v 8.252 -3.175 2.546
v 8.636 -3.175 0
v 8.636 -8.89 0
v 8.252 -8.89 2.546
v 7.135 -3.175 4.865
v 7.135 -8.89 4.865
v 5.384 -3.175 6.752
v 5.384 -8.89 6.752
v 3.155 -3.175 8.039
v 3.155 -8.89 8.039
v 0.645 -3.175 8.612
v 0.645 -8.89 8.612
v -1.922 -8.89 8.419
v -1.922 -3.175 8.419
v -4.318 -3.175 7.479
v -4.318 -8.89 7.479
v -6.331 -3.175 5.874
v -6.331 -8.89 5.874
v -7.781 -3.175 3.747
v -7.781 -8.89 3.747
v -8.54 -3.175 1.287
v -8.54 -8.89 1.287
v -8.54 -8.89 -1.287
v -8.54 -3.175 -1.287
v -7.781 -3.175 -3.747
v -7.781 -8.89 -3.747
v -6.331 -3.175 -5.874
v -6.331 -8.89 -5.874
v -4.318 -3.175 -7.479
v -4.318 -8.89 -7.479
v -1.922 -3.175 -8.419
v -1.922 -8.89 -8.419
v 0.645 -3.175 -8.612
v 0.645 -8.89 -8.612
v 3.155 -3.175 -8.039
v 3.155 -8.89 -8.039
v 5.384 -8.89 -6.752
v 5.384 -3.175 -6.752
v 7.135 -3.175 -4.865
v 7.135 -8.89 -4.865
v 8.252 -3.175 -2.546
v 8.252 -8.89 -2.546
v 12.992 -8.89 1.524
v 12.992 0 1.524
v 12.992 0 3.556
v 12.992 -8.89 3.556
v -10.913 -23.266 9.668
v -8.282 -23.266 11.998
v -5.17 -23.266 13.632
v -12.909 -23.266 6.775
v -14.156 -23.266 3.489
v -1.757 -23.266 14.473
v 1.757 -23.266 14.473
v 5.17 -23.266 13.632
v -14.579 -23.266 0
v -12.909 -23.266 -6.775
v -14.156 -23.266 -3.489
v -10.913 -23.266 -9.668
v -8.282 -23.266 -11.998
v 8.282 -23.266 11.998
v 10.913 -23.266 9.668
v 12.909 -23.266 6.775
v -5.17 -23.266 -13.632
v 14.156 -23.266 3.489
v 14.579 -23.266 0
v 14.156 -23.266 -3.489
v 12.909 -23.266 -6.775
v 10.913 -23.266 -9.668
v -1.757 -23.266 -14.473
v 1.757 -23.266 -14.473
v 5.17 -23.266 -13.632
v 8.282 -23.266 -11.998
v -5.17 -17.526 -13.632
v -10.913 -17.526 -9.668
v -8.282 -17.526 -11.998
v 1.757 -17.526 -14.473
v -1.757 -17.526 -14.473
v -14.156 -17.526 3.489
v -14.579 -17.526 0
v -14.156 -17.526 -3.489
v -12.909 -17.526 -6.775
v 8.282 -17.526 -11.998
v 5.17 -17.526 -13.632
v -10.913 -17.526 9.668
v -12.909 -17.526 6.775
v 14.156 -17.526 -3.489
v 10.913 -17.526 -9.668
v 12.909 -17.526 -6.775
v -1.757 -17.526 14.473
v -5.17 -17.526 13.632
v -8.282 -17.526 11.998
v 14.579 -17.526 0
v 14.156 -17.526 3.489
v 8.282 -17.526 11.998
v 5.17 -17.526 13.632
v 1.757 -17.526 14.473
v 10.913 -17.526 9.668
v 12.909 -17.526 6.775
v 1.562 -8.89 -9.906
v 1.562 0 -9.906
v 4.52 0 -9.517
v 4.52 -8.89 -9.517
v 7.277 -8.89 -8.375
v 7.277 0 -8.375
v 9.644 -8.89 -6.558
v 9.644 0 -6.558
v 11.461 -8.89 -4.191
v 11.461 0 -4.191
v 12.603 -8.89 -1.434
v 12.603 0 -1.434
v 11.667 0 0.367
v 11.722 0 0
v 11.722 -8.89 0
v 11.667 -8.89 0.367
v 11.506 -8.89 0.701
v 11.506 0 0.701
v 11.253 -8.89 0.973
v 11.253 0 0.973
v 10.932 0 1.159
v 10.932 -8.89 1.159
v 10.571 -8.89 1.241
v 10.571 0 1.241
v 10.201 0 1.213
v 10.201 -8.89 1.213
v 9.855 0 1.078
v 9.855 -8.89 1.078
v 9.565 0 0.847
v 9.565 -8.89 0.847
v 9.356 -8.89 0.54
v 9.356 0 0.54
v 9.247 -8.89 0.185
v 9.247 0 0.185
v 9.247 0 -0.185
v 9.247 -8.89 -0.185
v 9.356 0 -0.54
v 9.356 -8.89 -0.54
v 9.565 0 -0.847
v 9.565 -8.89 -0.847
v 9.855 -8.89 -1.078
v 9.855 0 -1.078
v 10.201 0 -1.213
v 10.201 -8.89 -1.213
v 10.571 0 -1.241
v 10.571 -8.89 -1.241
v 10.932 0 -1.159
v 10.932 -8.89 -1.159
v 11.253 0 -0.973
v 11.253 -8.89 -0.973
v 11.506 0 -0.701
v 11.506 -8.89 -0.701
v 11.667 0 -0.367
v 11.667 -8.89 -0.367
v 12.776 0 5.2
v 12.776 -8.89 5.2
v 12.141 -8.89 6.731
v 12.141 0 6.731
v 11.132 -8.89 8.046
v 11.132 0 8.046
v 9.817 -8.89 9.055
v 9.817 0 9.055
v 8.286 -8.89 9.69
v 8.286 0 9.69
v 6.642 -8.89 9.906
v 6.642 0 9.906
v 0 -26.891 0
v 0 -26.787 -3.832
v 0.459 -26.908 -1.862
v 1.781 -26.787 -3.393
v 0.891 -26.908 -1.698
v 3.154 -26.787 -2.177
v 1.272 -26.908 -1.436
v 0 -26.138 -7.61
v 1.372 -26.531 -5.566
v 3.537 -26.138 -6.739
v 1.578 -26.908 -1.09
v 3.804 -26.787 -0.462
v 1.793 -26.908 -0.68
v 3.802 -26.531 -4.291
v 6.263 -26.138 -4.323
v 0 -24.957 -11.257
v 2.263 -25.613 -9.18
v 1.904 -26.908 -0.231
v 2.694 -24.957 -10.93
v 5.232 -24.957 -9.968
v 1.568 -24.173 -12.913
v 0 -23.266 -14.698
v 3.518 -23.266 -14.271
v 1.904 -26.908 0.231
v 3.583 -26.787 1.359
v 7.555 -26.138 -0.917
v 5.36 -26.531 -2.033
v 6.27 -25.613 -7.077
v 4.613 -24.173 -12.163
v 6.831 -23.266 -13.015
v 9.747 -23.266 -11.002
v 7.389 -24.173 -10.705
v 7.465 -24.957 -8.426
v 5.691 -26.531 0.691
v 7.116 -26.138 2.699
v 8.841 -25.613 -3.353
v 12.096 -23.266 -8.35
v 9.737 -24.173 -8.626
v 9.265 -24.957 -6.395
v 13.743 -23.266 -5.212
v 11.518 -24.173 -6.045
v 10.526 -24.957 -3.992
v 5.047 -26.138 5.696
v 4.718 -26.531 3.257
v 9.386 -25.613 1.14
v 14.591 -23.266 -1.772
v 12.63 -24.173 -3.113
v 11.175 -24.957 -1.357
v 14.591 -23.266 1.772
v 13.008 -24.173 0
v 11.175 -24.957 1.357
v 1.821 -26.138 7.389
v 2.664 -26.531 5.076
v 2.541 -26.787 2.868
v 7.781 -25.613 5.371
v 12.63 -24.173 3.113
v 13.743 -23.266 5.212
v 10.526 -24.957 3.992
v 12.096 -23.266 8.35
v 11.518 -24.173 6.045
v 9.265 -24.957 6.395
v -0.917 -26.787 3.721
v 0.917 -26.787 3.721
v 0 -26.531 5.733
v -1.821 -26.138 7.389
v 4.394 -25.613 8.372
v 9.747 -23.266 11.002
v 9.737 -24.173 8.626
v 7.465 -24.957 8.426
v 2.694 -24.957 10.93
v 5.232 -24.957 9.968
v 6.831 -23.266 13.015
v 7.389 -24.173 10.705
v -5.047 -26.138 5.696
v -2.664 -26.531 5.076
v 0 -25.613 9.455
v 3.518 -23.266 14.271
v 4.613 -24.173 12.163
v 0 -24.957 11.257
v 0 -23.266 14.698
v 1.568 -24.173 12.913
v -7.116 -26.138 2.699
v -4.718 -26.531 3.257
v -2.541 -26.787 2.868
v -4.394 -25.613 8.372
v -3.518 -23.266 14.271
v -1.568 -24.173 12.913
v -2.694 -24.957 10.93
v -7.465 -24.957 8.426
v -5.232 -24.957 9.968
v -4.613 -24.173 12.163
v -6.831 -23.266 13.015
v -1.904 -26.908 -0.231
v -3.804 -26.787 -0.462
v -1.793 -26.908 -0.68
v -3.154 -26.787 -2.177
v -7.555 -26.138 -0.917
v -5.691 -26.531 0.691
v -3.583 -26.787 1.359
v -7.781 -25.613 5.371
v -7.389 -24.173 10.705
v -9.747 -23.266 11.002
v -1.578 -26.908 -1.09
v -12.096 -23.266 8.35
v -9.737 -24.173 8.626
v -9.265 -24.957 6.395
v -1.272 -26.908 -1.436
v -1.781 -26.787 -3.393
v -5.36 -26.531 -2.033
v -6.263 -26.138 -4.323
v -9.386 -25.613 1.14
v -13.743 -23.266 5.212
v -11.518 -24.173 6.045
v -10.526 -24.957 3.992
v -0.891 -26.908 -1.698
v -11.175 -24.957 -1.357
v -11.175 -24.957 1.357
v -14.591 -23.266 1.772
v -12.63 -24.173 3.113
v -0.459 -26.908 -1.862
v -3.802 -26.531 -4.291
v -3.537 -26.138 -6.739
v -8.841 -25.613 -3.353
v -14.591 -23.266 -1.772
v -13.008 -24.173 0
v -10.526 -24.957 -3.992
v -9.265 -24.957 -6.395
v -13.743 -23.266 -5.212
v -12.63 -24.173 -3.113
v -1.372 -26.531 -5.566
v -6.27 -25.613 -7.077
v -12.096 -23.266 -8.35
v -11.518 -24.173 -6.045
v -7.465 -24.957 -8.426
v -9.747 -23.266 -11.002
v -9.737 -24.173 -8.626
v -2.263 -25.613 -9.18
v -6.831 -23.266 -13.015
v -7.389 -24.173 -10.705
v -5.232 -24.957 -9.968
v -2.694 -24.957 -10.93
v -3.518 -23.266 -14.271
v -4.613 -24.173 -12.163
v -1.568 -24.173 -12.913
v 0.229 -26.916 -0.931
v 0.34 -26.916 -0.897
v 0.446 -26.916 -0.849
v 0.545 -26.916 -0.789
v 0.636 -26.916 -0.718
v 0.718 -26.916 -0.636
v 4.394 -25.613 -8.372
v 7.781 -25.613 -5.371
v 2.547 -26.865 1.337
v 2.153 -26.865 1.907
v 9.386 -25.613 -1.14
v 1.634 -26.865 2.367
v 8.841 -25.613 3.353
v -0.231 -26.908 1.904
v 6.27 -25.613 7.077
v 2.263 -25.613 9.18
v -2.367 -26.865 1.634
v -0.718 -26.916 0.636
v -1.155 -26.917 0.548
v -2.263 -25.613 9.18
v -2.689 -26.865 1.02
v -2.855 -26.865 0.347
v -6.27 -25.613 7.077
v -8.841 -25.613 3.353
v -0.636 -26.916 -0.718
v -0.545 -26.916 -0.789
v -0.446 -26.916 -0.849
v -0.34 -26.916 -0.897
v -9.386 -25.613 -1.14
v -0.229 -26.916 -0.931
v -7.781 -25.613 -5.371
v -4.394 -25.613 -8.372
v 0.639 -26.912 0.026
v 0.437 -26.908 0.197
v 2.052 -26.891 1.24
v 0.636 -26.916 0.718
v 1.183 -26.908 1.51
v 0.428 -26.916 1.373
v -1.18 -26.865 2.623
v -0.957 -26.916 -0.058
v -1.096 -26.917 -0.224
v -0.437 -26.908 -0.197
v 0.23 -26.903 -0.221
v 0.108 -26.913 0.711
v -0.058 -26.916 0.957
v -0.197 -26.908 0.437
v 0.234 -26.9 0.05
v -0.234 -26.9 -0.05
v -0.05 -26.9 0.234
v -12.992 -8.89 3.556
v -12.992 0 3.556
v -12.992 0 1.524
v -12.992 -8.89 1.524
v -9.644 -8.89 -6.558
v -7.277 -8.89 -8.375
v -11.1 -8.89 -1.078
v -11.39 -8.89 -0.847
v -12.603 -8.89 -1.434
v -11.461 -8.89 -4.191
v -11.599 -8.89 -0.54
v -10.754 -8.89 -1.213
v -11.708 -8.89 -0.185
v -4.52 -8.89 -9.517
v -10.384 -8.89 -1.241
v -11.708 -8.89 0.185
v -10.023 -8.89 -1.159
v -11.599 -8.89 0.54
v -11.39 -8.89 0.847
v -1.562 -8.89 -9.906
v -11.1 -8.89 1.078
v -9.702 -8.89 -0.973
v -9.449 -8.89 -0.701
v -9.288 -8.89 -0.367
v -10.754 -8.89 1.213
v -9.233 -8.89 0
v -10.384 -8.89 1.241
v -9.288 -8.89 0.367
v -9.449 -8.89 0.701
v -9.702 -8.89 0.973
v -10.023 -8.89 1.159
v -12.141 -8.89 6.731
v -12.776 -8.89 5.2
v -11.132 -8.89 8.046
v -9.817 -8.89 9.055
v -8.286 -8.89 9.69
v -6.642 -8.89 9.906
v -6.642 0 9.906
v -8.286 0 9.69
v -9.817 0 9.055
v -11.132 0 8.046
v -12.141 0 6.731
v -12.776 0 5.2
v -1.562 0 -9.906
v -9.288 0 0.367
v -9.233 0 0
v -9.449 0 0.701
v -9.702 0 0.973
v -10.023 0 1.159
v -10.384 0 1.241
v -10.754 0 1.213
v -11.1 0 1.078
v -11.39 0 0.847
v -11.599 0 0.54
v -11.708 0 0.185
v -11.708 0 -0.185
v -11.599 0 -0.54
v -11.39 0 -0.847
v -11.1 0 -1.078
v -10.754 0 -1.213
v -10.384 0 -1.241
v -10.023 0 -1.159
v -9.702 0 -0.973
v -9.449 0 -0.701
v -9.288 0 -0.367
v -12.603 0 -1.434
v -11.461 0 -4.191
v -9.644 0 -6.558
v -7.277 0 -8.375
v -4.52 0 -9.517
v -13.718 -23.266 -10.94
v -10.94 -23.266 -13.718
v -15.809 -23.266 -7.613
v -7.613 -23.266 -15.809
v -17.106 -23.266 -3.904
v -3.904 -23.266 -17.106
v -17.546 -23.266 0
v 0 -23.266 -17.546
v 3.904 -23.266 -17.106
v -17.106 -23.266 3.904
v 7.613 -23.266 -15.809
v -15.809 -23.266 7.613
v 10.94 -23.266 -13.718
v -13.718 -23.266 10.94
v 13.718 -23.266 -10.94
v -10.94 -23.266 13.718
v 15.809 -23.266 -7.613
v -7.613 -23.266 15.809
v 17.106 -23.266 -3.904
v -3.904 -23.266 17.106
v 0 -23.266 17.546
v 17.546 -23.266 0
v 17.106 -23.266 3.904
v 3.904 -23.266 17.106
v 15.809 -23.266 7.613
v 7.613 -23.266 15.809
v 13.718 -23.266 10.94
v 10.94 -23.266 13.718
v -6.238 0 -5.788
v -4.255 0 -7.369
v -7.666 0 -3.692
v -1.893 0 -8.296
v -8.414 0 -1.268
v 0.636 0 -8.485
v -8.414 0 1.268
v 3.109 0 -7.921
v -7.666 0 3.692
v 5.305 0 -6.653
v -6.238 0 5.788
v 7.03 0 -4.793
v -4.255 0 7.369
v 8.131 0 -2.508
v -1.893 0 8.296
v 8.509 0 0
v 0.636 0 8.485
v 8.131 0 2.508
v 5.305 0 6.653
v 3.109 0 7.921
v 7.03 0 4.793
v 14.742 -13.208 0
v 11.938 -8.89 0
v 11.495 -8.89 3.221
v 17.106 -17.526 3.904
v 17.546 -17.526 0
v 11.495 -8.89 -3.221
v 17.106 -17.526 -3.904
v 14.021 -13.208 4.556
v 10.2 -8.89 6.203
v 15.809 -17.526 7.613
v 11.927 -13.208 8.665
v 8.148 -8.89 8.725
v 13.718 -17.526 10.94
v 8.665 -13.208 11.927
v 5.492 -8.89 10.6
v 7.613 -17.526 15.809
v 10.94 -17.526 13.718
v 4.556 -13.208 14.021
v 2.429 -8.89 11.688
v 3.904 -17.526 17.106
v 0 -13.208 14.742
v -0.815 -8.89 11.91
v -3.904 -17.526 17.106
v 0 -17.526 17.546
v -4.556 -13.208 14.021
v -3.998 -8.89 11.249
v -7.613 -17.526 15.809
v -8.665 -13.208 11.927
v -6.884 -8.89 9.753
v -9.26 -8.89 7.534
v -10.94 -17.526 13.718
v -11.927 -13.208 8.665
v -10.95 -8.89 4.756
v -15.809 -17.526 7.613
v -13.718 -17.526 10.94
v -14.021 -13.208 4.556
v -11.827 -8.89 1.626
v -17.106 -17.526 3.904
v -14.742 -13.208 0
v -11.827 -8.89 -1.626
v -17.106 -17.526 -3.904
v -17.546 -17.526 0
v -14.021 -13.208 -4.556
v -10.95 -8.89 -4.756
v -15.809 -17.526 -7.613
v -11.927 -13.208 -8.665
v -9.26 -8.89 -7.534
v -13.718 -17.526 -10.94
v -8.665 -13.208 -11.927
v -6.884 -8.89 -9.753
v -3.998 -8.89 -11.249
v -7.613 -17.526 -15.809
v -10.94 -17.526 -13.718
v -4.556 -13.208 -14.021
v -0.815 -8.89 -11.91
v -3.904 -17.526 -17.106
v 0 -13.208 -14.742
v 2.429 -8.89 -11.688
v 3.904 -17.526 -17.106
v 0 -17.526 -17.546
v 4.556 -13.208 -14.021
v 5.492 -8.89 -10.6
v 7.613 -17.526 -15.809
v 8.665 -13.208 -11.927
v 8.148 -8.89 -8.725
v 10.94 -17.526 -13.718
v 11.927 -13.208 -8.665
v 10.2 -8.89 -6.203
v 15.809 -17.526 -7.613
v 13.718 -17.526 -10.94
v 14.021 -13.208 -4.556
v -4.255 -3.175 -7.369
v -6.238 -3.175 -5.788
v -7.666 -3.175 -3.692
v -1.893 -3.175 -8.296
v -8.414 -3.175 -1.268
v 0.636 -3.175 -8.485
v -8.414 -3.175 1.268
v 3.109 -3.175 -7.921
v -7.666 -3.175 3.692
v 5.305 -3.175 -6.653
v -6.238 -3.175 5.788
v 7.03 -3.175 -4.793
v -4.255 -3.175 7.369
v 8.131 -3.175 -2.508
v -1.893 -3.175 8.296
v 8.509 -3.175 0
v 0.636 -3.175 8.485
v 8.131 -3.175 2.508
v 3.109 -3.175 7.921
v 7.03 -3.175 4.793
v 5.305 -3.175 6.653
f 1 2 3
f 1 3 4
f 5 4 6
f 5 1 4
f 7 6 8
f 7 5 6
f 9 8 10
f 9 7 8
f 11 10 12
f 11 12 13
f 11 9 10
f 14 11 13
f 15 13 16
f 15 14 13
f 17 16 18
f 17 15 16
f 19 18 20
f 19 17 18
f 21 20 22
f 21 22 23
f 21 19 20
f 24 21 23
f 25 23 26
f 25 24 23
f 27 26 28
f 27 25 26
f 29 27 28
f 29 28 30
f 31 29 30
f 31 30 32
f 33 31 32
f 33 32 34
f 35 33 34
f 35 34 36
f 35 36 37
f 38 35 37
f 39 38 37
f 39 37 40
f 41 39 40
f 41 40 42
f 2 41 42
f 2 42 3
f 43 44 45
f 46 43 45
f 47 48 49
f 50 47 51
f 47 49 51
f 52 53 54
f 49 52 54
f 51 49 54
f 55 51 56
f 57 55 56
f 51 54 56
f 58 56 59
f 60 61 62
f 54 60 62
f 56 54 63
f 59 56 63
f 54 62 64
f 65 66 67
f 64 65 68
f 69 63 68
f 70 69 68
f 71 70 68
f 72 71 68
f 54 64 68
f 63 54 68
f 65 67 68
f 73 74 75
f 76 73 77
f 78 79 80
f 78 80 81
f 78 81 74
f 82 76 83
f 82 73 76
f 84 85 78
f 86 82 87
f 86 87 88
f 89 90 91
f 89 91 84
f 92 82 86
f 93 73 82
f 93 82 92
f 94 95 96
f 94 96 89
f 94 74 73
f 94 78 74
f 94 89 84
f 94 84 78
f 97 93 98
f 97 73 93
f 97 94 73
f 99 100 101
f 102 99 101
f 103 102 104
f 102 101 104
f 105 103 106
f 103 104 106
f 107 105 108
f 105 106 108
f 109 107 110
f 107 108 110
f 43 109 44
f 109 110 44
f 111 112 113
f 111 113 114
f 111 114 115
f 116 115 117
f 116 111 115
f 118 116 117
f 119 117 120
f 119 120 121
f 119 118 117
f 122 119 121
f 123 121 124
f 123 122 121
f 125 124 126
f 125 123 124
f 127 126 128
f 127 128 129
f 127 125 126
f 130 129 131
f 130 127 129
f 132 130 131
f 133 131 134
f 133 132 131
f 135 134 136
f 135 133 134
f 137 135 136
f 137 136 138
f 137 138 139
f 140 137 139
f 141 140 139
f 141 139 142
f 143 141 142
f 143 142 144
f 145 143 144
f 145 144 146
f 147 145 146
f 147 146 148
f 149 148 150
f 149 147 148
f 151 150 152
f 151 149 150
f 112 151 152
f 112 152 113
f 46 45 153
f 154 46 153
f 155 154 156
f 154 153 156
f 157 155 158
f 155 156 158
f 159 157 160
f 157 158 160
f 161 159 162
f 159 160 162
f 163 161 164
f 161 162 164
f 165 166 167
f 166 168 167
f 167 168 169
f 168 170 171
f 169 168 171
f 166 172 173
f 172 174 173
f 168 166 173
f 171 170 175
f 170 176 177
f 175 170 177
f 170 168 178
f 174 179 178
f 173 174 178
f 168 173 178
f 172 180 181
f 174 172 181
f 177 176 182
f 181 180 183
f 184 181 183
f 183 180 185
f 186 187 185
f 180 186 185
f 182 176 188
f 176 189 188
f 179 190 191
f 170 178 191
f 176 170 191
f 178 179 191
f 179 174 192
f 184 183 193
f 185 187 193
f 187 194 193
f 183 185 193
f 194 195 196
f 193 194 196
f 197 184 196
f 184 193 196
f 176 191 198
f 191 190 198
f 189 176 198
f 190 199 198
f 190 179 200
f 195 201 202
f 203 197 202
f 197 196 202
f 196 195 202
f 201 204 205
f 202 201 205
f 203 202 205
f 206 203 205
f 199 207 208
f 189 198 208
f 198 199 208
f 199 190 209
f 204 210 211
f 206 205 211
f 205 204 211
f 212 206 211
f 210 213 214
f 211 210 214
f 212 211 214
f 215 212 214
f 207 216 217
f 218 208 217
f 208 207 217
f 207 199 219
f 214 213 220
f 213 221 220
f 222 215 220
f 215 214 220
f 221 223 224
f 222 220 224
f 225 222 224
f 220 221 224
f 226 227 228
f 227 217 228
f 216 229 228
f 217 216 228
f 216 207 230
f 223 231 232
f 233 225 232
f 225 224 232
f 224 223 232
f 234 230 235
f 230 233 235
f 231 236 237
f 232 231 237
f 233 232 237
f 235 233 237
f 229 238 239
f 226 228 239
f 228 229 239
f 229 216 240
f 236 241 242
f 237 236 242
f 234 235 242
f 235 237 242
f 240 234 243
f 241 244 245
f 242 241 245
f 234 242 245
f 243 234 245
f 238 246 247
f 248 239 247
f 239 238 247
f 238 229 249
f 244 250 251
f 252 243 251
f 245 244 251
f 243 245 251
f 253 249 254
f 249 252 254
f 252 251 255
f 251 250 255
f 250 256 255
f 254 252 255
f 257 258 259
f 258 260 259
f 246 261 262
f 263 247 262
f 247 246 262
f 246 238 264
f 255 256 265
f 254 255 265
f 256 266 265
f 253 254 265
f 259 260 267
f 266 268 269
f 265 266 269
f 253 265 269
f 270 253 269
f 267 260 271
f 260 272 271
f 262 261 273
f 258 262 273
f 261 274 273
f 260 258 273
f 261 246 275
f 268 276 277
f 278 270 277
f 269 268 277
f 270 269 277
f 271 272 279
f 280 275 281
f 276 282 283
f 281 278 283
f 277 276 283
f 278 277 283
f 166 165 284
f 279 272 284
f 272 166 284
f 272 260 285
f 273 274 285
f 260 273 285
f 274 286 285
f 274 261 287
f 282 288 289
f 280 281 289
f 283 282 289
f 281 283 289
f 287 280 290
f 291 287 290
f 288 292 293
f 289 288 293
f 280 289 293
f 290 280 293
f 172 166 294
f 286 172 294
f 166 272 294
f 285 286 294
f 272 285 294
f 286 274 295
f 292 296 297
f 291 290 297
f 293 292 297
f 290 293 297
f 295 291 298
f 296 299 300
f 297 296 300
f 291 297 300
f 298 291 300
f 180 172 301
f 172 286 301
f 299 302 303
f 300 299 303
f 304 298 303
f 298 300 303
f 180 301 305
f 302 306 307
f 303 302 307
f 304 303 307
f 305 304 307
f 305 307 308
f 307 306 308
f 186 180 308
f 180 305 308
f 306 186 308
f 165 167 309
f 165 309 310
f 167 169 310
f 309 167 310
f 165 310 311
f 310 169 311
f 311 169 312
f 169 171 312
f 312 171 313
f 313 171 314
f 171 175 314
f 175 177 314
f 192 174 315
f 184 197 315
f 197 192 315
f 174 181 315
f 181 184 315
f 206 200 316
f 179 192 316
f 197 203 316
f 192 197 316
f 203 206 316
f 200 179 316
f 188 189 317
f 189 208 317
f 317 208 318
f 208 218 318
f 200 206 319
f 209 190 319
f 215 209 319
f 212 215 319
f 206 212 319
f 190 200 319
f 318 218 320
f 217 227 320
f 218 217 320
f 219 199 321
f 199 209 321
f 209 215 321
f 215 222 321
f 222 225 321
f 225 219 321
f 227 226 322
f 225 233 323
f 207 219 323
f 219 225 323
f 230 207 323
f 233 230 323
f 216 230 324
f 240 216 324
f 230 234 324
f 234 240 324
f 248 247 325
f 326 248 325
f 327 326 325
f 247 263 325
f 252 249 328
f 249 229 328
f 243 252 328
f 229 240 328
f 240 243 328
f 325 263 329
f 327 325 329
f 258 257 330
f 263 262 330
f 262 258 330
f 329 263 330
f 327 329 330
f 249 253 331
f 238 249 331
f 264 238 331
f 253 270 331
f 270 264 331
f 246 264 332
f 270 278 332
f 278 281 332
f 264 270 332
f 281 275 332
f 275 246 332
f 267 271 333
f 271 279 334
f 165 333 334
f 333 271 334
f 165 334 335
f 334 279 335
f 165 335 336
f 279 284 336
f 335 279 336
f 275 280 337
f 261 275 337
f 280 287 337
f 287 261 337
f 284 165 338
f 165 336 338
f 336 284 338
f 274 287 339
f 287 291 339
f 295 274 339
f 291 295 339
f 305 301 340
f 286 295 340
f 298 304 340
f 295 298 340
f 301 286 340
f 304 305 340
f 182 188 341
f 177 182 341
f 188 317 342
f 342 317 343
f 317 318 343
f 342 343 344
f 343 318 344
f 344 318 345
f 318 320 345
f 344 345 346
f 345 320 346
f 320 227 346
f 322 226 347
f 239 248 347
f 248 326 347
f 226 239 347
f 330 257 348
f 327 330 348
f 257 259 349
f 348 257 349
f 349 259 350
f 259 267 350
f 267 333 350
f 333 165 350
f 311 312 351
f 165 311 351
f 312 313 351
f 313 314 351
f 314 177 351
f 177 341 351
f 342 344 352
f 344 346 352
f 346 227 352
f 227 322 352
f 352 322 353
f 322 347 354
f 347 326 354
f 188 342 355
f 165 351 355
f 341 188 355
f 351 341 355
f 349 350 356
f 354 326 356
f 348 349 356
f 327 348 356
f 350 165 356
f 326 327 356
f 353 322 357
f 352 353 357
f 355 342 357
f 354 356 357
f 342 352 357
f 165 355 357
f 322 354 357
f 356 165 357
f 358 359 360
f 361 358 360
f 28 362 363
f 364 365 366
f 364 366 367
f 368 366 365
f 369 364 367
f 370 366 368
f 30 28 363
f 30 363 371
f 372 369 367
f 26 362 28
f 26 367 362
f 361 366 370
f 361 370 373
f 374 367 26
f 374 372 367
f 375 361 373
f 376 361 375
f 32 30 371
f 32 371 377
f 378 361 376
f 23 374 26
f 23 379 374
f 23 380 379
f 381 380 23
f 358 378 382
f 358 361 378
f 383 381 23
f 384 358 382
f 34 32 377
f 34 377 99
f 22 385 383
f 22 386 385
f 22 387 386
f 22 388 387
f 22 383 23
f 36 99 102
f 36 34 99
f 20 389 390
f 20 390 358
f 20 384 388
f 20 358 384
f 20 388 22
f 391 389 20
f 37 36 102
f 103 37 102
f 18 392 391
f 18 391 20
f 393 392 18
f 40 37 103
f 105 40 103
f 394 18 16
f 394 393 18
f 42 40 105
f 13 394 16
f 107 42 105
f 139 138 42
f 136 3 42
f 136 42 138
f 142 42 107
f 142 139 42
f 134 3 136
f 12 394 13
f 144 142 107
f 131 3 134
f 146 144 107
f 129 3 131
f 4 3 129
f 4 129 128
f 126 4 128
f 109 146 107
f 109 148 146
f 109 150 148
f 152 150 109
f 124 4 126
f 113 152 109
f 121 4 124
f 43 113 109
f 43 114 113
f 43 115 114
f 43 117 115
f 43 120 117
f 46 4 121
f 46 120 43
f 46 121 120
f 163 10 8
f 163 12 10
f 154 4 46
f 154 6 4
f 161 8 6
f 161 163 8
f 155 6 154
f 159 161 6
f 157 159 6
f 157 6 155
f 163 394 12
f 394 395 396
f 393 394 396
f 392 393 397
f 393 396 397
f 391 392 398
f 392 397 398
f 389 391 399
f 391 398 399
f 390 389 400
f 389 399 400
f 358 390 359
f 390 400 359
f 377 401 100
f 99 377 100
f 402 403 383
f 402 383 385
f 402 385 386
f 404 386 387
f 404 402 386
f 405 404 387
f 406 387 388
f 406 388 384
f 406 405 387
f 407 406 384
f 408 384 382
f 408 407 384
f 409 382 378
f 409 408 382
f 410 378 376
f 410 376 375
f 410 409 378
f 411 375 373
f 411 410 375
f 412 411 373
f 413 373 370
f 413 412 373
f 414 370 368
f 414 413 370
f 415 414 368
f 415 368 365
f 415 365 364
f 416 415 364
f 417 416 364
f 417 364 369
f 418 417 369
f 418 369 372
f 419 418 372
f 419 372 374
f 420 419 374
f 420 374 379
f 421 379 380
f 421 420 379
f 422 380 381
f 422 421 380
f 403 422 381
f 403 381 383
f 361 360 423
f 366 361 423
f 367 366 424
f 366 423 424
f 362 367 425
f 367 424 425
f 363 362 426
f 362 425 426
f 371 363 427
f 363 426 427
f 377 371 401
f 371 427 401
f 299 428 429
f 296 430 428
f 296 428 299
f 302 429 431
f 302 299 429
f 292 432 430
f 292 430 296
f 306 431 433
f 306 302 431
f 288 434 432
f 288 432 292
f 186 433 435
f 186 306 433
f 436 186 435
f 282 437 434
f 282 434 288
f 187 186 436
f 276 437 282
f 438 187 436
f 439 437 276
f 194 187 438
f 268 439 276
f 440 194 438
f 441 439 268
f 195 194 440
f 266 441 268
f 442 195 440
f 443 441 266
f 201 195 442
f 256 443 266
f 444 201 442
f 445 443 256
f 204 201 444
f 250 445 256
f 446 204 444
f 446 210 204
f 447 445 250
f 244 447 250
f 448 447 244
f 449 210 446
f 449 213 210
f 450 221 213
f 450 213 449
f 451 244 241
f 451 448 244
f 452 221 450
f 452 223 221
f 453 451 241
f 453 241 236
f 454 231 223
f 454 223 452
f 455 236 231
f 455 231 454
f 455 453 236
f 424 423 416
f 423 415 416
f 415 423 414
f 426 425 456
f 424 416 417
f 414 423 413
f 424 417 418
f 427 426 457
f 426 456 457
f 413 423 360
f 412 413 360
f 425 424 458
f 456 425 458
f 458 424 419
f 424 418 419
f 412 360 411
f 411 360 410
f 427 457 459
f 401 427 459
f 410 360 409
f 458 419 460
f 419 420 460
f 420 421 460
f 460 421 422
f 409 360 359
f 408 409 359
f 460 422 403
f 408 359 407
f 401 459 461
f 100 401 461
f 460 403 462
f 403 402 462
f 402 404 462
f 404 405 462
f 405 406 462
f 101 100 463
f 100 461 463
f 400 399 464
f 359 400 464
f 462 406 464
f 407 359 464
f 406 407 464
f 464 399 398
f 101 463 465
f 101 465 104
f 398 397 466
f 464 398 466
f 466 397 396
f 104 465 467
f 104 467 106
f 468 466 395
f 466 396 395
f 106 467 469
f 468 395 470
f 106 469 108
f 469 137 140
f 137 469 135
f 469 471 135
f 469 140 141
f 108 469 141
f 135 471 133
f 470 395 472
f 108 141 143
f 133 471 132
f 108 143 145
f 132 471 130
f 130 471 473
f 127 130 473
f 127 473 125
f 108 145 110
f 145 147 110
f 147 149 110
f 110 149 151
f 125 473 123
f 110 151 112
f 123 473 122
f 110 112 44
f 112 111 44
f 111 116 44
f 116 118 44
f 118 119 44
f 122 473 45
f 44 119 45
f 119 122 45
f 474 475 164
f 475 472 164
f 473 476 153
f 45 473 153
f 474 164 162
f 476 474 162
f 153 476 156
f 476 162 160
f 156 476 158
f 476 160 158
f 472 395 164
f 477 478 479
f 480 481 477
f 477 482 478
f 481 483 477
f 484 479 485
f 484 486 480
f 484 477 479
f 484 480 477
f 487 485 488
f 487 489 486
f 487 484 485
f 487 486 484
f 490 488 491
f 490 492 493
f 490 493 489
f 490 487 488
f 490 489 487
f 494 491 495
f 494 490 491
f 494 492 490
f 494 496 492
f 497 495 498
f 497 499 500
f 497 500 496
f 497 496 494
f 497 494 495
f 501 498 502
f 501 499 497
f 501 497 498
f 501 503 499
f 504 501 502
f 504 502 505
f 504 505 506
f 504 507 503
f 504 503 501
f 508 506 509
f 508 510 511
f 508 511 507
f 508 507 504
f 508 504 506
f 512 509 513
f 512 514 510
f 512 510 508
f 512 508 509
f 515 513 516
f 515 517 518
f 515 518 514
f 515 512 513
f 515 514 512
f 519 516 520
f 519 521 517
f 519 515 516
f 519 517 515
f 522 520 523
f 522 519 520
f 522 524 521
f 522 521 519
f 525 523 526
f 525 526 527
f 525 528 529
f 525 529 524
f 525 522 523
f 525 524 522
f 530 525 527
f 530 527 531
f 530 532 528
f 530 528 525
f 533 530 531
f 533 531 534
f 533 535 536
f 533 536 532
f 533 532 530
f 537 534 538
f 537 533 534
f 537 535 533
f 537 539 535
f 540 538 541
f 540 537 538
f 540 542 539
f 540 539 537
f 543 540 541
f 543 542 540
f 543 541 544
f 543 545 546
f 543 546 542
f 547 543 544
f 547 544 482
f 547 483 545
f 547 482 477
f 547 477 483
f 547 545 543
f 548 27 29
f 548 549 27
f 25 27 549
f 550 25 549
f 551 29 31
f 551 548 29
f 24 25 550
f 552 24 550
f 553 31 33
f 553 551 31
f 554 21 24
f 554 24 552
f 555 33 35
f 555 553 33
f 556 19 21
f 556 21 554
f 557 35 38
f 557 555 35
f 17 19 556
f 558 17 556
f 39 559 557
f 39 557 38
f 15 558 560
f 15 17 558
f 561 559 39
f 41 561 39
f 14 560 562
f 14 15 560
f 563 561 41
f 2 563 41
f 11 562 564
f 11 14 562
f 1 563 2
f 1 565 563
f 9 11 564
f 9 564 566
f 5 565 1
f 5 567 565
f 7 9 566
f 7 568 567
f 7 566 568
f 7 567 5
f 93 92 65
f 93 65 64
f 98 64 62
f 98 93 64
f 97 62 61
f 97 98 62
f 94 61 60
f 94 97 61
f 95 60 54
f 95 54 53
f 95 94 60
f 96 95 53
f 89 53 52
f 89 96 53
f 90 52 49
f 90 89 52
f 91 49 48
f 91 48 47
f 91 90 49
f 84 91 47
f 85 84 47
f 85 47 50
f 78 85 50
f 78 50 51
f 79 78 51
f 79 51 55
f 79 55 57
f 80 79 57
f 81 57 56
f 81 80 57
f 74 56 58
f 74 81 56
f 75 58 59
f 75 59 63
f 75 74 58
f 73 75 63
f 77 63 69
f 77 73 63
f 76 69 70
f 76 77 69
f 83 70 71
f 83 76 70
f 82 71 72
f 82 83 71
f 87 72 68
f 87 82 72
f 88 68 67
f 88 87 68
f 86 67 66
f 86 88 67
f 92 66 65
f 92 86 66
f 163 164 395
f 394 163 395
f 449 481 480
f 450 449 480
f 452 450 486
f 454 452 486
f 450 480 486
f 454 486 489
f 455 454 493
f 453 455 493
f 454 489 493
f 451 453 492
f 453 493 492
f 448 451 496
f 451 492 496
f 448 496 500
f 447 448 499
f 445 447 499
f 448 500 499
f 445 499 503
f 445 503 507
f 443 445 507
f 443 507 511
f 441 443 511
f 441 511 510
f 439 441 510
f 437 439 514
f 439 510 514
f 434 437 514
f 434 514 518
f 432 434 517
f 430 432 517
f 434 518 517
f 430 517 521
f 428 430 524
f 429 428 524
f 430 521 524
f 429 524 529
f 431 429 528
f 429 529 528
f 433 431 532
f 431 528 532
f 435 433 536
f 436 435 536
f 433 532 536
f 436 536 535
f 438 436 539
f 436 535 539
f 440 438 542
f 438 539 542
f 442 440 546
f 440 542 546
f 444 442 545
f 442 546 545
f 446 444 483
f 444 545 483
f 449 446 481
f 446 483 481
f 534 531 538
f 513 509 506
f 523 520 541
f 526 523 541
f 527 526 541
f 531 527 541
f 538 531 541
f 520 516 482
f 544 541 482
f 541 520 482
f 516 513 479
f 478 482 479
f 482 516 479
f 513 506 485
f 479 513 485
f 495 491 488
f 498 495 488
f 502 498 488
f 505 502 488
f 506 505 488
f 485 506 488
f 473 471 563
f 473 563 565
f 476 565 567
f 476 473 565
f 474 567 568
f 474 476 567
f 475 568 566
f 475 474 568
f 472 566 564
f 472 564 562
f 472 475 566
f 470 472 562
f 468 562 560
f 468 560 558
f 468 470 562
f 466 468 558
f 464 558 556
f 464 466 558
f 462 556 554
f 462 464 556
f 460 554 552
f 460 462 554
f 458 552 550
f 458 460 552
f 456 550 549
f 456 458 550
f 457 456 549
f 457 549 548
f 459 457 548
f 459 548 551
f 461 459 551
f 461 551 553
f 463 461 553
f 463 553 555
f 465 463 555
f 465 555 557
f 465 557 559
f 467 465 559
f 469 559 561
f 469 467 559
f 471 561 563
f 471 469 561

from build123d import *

# Parameters (mm, degrees)
F0_R     = 1.2446
F0_R_2   = 8.636
F1_DEPTH = 8.89
F0_R_3   = 8.509
F2_DEPTH = 3.175
F3_R     = 11.938
F4_DEPTH = 8.636
F4_TAPER = -33
F5_R     = 17.54632
F5_R_2   = 14.5791622743
F6_DEPTH = 5.7404


with BuildPart() as f1:
    # F0 (on Front) → F1 (new body)
    with BuildSketch(Plane.XZ):
        with BuildLine():
            Line((6.6421, 9.906), (-6.6421, 9.906))
            ThreePointArc((-6.6421, 9.906), (-11.1322280605, 8.0461280605), (-12.9921, 3.556))
            Line((-12.9921, 3.556), (-12.9921, 1.524))
            ThreePointArc((-12.9921, 1.524), (-9.644330509, -6.558230509), (-1.5621, -9.906))
            Line((-1.5621, -9.906), (1.5621, -9.906))
            ThreePointArc((1.5621, -9.906), (9.644330509, -6.558230509), (12.9921, 1.524))
            Line((12.9921, 1.524), (12.9921, 3.556))
            ThreePointArc((12.9921, 3.556), (11.1322280605, 8.0461280605), (6.6421, 9.906))
        make_face()
        with Locations((-10.4775, 0)):
            Circle(F0_R, mode=Mode.SUBTRACT)
        Circle(F0_R_2, mode=Mode.SUBTRACT)
        with Locations((10.4775, 0)):
            Circle(F0_R, mode=Mode.SUBTRACT)
    extrude(amount=F1_DEPTH)

    # F0 (on Front) → F2 (join)
    with BuildSketch(Plane.XZ):
        Circle(F0_R_2)
        Circle(F0_R_3, mode=Mode.SUBTRACT)
    extrude(amount=F2_DEPTH)


with BuildPart() as f4:
    # F3 (on face) → F4 (new body)
    with BuildSketch(Plane.XZ.offset(8.89)):
        Circle(F3_R)
    extrude(amount=F4_DEPTH, taper=F4_TAPER)

    # F5 (on face) → F6 (join)
    with BuildSketch(Plane.XZ.offset(17.526)):
        Circle(F5_R)
        Circle(F5_R_2, mode=Mode.SUBTRACT)
    extrude(amount=F6_DEPTH)

    # F7 (on Right) → F8 (revolve)
    with BuildSketch(Plane.YZ):
        with BuildLine():
            Line((-23.2664, 0), (-26.8908049911, 0))
            ThreePointArc((-26.8908049911, 0), (-26.1383181436, -7.6104076675), (-23.2664, -14.6981878206))
            Line((-23.2664, -14.6981878206), (-23.2664, 0))
        make_face()
    revolve(axis=Axis((0, -25.0786024956, 0), (0, -1, 0)))


solid = Compound([f1.part, f4.part])
